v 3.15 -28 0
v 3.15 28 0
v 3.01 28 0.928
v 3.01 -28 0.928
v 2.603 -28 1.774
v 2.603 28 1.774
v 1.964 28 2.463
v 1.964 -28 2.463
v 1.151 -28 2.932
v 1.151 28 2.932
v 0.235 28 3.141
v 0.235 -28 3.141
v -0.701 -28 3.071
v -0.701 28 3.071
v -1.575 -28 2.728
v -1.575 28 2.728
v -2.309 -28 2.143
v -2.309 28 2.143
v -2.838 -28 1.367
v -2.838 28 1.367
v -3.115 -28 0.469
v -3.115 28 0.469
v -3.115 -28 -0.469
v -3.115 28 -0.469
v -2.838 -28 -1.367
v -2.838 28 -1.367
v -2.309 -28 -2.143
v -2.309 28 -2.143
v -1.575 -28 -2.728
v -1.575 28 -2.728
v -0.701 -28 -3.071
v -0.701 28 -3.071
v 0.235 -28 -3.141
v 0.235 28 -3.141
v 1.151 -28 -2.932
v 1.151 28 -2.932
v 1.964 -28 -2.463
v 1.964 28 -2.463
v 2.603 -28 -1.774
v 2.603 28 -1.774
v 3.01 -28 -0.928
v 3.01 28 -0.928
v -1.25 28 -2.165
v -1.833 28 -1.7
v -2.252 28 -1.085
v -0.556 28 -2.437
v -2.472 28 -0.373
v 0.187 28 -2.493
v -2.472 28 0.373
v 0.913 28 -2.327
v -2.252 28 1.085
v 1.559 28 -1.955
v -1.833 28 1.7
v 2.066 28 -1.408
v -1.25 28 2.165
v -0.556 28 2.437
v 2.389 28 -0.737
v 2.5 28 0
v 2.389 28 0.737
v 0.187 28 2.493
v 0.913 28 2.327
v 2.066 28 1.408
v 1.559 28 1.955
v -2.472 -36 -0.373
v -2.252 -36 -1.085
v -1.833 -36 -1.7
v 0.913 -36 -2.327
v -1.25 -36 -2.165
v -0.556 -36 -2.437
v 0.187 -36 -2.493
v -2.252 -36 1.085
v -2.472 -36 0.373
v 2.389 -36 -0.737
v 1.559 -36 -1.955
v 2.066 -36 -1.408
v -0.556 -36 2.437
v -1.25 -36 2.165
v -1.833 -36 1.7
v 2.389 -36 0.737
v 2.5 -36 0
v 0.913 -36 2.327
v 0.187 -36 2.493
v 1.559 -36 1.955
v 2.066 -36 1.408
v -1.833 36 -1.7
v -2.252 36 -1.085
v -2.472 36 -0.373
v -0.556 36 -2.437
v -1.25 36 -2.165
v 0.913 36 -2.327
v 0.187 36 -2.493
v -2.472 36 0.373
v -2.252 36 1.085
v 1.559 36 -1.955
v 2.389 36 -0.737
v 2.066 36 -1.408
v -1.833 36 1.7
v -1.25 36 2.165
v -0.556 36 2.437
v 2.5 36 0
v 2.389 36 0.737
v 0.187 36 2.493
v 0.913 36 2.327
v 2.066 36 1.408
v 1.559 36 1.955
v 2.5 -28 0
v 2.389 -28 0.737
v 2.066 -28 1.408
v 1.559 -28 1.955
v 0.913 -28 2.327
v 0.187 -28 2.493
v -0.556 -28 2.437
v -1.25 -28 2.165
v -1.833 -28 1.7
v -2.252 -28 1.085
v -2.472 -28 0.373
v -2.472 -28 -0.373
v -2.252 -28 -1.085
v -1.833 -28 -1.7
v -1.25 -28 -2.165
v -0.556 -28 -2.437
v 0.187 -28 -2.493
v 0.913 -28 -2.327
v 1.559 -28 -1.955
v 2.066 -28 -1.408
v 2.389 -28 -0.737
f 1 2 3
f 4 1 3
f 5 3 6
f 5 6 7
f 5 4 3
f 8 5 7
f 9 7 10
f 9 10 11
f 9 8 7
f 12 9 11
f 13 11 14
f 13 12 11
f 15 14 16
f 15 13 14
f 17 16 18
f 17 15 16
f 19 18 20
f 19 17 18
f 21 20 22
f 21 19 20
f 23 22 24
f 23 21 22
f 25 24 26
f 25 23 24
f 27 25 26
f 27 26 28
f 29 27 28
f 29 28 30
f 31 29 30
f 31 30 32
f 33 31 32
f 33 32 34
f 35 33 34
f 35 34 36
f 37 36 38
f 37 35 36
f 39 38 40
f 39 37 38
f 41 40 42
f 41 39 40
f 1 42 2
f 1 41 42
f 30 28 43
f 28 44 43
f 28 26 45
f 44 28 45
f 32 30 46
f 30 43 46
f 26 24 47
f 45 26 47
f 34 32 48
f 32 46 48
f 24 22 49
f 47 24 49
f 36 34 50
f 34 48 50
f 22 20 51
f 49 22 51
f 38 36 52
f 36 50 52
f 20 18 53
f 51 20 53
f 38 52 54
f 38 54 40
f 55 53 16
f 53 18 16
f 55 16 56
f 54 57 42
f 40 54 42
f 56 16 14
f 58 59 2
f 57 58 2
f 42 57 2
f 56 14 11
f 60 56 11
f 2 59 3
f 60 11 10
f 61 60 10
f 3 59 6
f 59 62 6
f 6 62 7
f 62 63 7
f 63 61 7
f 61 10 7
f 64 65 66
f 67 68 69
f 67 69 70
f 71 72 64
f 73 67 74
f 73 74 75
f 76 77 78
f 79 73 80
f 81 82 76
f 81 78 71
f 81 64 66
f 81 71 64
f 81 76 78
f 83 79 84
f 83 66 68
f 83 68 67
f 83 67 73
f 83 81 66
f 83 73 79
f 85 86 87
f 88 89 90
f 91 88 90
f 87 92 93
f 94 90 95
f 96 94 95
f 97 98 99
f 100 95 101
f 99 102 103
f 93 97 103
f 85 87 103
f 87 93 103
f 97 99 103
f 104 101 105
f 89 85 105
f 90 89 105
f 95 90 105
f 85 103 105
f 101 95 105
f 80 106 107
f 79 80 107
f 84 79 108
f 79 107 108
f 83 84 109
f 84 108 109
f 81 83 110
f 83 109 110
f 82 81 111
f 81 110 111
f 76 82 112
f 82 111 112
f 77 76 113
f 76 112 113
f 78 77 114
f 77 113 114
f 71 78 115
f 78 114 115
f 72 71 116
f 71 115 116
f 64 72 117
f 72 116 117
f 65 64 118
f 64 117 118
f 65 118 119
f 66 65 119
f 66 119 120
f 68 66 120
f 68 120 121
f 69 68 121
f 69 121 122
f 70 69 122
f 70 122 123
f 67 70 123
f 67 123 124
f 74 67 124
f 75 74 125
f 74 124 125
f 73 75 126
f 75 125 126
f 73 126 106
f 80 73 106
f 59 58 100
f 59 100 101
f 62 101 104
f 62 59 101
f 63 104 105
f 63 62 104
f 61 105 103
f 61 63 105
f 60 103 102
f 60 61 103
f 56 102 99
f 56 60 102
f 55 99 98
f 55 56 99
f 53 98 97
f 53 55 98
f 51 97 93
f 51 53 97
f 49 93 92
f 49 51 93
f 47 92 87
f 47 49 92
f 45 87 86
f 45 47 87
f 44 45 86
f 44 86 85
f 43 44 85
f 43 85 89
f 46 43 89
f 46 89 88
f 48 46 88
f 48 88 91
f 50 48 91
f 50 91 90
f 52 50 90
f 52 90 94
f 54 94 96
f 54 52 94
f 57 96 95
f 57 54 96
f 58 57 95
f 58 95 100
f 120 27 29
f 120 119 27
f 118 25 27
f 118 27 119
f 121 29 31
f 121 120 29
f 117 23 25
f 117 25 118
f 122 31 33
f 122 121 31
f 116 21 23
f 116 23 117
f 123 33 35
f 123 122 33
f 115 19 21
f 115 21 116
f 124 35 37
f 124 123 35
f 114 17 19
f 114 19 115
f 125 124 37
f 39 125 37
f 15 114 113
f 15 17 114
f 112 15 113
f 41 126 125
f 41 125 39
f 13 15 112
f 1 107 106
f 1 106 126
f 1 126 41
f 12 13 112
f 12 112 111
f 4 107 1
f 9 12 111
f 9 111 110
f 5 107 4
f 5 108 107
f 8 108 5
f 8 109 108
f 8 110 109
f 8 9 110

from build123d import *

# Parameters (mm, degrees)
F0_R     = 3.15
F1_DEPTH = 28
F2_R     = 2.5
F3_DEPTH = 8


# Not quite as in the source:
# - a pattern or mirror of a feature is missing from the dataset's text; its kind, count and spacing are read off the source's solid


with BuildPart() as f1:
    # F0 (on Front) → F1 (new body, symmetric)
    with BuildSketch(Plane.XZ):
        Circle(F0_R)
    extrude(amount=F1_DEPTH, both=True)

    # F2 (on face) → F3 (join)
    with BuildSketch(Plane.XZ.offset(28)):
        Circle(F2_R)
    f3 = extrude(amount=F3_DEPTH)

    # F3_copies: F3 across plane
    add(f3.mirror(Plane.ZX))


solid = f1.part
